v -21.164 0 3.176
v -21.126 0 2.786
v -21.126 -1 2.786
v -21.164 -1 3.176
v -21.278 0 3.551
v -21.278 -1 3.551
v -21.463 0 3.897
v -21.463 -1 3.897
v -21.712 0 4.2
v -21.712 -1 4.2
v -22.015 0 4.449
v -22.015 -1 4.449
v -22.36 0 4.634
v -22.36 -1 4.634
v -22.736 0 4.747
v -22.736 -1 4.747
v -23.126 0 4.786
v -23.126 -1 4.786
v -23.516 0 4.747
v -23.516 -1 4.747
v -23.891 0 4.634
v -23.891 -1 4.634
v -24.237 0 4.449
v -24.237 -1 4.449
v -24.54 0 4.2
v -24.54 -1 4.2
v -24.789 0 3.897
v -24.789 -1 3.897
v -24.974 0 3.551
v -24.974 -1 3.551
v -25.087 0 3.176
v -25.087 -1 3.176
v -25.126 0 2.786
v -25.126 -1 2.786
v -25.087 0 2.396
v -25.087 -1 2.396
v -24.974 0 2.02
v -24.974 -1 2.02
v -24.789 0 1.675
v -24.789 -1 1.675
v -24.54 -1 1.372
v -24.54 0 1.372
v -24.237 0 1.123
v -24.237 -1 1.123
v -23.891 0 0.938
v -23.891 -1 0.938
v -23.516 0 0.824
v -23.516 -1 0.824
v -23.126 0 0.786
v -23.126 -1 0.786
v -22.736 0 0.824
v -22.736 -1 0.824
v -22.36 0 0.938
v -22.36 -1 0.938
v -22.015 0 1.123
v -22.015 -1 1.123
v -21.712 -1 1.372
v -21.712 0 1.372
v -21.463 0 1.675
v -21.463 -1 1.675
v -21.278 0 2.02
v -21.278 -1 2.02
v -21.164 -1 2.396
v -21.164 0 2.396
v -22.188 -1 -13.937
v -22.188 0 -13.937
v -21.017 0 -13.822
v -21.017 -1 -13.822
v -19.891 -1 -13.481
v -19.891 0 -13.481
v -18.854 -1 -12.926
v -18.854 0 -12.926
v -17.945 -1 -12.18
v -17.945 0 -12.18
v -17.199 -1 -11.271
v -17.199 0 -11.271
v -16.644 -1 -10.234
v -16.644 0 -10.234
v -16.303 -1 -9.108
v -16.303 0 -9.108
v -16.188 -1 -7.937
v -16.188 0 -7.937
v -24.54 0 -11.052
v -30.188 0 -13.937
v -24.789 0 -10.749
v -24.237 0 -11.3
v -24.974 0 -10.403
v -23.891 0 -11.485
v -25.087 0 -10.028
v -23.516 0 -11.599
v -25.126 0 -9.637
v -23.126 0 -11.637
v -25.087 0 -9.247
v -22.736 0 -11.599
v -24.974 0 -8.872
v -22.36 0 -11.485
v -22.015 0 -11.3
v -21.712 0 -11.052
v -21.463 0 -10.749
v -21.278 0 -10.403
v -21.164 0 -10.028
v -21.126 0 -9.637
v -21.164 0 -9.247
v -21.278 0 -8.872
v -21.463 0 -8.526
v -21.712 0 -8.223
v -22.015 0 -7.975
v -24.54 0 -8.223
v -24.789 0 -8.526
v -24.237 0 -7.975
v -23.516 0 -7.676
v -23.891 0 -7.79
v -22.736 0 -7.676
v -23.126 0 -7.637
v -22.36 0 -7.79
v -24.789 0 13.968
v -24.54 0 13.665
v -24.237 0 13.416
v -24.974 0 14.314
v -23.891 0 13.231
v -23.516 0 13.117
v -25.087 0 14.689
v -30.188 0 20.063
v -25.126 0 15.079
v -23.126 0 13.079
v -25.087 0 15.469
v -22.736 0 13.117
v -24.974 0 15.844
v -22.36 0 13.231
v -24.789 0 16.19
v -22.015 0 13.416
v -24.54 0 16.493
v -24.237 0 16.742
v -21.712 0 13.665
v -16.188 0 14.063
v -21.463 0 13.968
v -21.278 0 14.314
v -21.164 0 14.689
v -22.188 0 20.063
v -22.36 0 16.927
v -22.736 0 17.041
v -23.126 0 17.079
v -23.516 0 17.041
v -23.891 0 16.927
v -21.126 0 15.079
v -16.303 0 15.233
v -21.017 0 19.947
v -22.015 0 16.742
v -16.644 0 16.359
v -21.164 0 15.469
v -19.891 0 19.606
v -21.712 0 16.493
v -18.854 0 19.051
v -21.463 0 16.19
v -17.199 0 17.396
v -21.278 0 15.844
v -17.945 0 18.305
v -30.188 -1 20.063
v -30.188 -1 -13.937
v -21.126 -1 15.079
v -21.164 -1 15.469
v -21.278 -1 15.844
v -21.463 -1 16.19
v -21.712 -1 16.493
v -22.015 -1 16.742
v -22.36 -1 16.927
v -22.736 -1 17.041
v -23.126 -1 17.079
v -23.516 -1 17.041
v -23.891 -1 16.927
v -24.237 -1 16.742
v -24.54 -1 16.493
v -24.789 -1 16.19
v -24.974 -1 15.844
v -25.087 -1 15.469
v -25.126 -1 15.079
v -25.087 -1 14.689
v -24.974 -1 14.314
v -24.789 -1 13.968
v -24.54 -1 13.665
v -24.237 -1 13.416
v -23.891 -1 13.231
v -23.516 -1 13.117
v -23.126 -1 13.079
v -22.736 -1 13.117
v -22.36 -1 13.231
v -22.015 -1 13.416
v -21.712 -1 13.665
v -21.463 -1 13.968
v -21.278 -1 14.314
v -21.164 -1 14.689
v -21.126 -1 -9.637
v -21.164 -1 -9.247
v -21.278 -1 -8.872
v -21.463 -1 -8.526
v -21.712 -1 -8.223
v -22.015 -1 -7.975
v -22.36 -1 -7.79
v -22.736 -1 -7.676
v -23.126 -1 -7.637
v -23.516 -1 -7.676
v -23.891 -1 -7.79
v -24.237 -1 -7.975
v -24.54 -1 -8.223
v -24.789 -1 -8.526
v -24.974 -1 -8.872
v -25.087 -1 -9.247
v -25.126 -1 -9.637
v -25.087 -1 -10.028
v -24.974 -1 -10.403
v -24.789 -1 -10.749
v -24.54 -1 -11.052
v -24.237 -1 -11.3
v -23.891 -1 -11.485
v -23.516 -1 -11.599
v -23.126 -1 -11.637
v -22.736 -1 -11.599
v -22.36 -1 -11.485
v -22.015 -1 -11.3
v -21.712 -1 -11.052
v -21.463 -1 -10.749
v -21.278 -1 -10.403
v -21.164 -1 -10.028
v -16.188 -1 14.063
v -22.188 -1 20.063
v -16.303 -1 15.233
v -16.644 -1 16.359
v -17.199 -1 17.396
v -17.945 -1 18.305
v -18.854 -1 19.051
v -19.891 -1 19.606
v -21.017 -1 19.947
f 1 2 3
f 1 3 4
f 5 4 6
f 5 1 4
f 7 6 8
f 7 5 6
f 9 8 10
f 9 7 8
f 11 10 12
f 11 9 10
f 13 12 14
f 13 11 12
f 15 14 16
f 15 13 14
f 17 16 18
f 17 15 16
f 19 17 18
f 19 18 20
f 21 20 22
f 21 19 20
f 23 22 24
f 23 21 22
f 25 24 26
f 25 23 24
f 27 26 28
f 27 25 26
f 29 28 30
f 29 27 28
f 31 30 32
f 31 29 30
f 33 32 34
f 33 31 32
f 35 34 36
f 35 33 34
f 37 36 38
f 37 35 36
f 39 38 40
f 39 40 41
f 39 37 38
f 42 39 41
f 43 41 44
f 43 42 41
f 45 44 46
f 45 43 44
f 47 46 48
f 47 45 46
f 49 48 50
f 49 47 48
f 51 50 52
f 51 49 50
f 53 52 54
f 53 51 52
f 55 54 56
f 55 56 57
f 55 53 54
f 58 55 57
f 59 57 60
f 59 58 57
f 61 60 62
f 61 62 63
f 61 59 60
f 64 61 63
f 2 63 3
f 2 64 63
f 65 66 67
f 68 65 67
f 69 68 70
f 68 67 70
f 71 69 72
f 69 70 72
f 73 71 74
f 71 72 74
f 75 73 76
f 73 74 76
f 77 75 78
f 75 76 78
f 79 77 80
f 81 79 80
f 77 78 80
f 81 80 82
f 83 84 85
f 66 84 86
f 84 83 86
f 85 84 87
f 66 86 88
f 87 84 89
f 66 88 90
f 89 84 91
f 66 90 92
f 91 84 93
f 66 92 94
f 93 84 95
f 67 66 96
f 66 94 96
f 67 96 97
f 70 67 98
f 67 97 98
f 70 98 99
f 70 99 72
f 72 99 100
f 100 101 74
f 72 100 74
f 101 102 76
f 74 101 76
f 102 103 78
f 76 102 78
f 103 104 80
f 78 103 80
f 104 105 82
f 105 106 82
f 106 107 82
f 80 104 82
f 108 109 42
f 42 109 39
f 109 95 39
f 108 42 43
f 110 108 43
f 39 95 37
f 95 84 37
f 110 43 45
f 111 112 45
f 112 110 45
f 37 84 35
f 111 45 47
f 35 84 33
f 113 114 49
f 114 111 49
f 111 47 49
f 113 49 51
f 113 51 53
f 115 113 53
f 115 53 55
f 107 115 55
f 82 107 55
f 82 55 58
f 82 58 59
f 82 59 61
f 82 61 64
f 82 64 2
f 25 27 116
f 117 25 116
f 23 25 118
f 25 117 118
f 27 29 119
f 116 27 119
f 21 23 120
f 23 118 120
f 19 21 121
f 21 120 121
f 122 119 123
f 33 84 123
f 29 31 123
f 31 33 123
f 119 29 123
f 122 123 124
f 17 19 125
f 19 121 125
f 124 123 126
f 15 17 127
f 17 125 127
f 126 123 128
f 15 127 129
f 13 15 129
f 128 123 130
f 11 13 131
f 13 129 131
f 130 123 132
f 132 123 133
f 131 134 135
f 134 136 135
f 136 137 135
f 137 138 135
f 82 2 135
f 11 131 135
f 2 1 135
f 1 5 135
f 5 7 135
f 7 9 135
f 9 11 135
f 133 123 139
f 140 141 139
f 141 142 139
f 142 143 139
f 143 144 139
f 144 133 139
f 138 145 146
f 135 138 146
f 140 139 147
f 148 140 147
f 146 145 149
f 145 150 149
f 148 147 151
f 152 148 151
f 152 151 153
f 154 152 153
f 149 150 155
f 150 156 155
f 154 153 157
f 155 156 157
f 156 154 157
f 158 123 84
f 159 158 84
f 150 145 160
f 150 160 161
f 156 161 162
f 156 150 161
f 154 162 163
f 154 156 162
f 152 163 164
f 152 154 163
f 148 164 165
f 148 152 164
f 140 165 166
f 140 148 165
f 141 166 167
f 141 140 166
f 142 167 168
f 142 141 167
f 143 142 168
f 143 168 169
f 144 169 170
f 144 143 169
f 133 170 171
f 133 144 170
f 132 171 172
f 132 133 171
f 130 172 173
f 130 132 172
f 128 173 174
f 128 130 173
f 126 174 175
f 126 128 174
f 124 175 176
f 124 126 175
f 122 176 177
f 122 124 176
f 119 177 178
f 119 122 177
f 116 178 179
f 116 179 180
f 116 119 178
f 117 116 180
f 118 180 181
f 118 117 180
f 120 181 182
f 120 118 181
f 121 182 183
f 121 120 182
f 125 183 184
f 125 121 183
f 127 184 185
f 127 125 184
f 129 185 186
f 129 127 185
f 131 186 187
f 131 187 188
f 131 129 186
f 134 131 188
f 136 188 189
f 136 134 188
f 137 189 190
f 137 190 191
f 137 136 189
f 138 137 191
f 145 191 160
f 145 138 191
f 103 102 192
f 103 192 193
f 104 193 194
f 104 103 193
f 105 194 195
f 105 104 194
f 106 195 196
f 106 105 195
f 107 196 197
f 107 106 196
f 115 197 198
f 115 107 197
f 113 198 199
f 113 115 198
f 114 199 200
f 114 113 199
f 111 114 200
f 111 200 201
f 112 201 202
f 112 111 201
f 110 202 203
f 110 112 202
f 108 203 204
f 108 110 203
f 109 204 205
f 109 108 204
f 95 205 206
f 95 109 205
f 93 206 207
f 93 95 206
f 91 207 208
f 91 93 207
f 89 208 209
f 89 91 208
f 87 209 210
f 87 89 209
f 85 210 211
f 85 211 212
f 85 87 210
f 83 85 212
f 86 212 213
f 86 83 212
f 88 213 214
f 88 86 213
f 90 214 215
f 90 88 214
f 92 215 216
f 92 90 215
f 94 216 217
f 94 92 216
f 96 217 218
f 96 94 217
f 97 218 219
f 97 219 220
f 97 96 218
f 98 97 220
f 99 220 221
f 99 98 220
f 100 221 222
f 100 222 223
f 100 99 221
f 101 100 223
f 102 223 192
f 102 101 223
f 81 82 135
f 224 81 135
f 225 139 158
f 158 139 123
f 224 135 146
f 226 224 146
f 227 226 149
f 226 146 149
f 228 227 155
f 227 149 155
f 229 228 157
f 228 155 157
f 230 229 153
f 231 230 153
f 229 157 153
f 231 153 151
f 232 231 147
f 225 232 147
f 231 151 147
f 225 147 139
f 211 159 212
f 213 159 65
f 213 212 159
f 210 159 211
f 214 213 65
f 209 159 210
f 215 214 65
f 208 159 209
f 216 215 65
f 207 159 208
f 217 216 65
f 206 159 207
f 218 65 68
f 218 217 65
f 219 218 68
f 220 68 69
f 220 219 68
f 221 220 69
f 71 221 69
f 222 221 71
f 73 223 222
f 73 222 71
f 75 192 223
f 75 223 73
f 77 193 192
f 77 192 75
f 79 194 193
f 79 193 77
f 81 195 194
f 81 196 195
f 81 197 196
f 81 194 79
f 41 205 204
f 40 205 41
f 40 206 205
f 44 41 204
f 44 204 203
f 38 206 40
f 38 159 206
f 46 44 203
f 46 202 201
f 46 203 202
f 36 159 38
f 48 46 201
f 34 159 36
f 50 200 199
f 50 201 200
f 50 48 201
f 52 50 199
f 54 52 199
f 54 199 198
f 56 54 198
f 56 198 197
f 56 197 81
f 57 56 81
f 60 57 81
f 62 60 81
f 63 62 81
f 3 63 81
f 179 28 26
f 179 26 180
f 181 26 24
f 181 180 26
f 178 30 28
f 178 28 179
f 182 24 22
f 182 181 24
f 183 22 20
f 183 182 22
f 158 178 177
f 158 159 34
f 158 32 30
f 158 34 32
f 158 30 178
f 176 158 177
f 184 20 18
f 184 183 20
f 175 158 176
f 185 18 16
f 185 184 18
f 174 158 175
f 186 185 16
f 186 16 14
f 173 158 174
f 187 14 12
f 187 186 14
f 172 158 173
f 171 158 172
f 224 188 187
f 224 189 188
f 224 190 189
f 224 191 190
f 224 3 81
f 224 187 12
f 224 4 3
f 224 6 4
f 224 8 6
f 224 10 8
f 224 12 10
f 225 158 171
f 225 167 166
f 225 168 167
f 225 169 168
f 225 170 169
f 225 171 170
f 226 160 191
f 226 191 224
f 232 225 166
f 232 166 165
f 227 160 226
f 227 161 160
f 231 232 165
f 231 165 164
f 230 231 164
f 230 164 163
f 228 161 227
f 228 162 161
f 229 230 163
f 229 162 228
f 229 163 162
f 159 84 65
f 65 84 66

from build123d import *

# Parameters (mm, degrees)
F0_R     = 2
F1_DEPTH = 1


with BuildPart() as f1:
    # F0 (on Front) → F1 (new body)
    with BuildSketch(Plane.XZ):
        with BuildLine():
            Line((-30.187501, 20.062501), (-30.187501, -13.937499))
            Line((-30.187501, -13.937499), (-22.187501, -13.937499))
            ThreePointArc((-22.187501, -13.937499), (-17.94486, -12.18014), (-16.187501, -7.937499))
            Line((-16.187501, -7.937499), (-16.187501, 14.062501))
            ThreePointArc((-16.187501, 14.062501), (-17.94486, 18.305141), (-22.187501, 20.062501))
            Line((-22.187501, 20.062501), (-30.187501, 20.062501))
        make_face()
        with Locations((-23.125804, -9.637499)):
            Circle(F0_R, mode=Mode.SUBTRACT)
        with Locations((-23.125804, 2.785767)):
            Circle(F0_R, mode=Mode.SUBTRACT)
        with Locations((-23.125804, 15.079059)):
            Circle(F0_R, mode=Mode.SUBTRACT)
    extrude(amount=F1_DEPTH)


solid = f1.part
